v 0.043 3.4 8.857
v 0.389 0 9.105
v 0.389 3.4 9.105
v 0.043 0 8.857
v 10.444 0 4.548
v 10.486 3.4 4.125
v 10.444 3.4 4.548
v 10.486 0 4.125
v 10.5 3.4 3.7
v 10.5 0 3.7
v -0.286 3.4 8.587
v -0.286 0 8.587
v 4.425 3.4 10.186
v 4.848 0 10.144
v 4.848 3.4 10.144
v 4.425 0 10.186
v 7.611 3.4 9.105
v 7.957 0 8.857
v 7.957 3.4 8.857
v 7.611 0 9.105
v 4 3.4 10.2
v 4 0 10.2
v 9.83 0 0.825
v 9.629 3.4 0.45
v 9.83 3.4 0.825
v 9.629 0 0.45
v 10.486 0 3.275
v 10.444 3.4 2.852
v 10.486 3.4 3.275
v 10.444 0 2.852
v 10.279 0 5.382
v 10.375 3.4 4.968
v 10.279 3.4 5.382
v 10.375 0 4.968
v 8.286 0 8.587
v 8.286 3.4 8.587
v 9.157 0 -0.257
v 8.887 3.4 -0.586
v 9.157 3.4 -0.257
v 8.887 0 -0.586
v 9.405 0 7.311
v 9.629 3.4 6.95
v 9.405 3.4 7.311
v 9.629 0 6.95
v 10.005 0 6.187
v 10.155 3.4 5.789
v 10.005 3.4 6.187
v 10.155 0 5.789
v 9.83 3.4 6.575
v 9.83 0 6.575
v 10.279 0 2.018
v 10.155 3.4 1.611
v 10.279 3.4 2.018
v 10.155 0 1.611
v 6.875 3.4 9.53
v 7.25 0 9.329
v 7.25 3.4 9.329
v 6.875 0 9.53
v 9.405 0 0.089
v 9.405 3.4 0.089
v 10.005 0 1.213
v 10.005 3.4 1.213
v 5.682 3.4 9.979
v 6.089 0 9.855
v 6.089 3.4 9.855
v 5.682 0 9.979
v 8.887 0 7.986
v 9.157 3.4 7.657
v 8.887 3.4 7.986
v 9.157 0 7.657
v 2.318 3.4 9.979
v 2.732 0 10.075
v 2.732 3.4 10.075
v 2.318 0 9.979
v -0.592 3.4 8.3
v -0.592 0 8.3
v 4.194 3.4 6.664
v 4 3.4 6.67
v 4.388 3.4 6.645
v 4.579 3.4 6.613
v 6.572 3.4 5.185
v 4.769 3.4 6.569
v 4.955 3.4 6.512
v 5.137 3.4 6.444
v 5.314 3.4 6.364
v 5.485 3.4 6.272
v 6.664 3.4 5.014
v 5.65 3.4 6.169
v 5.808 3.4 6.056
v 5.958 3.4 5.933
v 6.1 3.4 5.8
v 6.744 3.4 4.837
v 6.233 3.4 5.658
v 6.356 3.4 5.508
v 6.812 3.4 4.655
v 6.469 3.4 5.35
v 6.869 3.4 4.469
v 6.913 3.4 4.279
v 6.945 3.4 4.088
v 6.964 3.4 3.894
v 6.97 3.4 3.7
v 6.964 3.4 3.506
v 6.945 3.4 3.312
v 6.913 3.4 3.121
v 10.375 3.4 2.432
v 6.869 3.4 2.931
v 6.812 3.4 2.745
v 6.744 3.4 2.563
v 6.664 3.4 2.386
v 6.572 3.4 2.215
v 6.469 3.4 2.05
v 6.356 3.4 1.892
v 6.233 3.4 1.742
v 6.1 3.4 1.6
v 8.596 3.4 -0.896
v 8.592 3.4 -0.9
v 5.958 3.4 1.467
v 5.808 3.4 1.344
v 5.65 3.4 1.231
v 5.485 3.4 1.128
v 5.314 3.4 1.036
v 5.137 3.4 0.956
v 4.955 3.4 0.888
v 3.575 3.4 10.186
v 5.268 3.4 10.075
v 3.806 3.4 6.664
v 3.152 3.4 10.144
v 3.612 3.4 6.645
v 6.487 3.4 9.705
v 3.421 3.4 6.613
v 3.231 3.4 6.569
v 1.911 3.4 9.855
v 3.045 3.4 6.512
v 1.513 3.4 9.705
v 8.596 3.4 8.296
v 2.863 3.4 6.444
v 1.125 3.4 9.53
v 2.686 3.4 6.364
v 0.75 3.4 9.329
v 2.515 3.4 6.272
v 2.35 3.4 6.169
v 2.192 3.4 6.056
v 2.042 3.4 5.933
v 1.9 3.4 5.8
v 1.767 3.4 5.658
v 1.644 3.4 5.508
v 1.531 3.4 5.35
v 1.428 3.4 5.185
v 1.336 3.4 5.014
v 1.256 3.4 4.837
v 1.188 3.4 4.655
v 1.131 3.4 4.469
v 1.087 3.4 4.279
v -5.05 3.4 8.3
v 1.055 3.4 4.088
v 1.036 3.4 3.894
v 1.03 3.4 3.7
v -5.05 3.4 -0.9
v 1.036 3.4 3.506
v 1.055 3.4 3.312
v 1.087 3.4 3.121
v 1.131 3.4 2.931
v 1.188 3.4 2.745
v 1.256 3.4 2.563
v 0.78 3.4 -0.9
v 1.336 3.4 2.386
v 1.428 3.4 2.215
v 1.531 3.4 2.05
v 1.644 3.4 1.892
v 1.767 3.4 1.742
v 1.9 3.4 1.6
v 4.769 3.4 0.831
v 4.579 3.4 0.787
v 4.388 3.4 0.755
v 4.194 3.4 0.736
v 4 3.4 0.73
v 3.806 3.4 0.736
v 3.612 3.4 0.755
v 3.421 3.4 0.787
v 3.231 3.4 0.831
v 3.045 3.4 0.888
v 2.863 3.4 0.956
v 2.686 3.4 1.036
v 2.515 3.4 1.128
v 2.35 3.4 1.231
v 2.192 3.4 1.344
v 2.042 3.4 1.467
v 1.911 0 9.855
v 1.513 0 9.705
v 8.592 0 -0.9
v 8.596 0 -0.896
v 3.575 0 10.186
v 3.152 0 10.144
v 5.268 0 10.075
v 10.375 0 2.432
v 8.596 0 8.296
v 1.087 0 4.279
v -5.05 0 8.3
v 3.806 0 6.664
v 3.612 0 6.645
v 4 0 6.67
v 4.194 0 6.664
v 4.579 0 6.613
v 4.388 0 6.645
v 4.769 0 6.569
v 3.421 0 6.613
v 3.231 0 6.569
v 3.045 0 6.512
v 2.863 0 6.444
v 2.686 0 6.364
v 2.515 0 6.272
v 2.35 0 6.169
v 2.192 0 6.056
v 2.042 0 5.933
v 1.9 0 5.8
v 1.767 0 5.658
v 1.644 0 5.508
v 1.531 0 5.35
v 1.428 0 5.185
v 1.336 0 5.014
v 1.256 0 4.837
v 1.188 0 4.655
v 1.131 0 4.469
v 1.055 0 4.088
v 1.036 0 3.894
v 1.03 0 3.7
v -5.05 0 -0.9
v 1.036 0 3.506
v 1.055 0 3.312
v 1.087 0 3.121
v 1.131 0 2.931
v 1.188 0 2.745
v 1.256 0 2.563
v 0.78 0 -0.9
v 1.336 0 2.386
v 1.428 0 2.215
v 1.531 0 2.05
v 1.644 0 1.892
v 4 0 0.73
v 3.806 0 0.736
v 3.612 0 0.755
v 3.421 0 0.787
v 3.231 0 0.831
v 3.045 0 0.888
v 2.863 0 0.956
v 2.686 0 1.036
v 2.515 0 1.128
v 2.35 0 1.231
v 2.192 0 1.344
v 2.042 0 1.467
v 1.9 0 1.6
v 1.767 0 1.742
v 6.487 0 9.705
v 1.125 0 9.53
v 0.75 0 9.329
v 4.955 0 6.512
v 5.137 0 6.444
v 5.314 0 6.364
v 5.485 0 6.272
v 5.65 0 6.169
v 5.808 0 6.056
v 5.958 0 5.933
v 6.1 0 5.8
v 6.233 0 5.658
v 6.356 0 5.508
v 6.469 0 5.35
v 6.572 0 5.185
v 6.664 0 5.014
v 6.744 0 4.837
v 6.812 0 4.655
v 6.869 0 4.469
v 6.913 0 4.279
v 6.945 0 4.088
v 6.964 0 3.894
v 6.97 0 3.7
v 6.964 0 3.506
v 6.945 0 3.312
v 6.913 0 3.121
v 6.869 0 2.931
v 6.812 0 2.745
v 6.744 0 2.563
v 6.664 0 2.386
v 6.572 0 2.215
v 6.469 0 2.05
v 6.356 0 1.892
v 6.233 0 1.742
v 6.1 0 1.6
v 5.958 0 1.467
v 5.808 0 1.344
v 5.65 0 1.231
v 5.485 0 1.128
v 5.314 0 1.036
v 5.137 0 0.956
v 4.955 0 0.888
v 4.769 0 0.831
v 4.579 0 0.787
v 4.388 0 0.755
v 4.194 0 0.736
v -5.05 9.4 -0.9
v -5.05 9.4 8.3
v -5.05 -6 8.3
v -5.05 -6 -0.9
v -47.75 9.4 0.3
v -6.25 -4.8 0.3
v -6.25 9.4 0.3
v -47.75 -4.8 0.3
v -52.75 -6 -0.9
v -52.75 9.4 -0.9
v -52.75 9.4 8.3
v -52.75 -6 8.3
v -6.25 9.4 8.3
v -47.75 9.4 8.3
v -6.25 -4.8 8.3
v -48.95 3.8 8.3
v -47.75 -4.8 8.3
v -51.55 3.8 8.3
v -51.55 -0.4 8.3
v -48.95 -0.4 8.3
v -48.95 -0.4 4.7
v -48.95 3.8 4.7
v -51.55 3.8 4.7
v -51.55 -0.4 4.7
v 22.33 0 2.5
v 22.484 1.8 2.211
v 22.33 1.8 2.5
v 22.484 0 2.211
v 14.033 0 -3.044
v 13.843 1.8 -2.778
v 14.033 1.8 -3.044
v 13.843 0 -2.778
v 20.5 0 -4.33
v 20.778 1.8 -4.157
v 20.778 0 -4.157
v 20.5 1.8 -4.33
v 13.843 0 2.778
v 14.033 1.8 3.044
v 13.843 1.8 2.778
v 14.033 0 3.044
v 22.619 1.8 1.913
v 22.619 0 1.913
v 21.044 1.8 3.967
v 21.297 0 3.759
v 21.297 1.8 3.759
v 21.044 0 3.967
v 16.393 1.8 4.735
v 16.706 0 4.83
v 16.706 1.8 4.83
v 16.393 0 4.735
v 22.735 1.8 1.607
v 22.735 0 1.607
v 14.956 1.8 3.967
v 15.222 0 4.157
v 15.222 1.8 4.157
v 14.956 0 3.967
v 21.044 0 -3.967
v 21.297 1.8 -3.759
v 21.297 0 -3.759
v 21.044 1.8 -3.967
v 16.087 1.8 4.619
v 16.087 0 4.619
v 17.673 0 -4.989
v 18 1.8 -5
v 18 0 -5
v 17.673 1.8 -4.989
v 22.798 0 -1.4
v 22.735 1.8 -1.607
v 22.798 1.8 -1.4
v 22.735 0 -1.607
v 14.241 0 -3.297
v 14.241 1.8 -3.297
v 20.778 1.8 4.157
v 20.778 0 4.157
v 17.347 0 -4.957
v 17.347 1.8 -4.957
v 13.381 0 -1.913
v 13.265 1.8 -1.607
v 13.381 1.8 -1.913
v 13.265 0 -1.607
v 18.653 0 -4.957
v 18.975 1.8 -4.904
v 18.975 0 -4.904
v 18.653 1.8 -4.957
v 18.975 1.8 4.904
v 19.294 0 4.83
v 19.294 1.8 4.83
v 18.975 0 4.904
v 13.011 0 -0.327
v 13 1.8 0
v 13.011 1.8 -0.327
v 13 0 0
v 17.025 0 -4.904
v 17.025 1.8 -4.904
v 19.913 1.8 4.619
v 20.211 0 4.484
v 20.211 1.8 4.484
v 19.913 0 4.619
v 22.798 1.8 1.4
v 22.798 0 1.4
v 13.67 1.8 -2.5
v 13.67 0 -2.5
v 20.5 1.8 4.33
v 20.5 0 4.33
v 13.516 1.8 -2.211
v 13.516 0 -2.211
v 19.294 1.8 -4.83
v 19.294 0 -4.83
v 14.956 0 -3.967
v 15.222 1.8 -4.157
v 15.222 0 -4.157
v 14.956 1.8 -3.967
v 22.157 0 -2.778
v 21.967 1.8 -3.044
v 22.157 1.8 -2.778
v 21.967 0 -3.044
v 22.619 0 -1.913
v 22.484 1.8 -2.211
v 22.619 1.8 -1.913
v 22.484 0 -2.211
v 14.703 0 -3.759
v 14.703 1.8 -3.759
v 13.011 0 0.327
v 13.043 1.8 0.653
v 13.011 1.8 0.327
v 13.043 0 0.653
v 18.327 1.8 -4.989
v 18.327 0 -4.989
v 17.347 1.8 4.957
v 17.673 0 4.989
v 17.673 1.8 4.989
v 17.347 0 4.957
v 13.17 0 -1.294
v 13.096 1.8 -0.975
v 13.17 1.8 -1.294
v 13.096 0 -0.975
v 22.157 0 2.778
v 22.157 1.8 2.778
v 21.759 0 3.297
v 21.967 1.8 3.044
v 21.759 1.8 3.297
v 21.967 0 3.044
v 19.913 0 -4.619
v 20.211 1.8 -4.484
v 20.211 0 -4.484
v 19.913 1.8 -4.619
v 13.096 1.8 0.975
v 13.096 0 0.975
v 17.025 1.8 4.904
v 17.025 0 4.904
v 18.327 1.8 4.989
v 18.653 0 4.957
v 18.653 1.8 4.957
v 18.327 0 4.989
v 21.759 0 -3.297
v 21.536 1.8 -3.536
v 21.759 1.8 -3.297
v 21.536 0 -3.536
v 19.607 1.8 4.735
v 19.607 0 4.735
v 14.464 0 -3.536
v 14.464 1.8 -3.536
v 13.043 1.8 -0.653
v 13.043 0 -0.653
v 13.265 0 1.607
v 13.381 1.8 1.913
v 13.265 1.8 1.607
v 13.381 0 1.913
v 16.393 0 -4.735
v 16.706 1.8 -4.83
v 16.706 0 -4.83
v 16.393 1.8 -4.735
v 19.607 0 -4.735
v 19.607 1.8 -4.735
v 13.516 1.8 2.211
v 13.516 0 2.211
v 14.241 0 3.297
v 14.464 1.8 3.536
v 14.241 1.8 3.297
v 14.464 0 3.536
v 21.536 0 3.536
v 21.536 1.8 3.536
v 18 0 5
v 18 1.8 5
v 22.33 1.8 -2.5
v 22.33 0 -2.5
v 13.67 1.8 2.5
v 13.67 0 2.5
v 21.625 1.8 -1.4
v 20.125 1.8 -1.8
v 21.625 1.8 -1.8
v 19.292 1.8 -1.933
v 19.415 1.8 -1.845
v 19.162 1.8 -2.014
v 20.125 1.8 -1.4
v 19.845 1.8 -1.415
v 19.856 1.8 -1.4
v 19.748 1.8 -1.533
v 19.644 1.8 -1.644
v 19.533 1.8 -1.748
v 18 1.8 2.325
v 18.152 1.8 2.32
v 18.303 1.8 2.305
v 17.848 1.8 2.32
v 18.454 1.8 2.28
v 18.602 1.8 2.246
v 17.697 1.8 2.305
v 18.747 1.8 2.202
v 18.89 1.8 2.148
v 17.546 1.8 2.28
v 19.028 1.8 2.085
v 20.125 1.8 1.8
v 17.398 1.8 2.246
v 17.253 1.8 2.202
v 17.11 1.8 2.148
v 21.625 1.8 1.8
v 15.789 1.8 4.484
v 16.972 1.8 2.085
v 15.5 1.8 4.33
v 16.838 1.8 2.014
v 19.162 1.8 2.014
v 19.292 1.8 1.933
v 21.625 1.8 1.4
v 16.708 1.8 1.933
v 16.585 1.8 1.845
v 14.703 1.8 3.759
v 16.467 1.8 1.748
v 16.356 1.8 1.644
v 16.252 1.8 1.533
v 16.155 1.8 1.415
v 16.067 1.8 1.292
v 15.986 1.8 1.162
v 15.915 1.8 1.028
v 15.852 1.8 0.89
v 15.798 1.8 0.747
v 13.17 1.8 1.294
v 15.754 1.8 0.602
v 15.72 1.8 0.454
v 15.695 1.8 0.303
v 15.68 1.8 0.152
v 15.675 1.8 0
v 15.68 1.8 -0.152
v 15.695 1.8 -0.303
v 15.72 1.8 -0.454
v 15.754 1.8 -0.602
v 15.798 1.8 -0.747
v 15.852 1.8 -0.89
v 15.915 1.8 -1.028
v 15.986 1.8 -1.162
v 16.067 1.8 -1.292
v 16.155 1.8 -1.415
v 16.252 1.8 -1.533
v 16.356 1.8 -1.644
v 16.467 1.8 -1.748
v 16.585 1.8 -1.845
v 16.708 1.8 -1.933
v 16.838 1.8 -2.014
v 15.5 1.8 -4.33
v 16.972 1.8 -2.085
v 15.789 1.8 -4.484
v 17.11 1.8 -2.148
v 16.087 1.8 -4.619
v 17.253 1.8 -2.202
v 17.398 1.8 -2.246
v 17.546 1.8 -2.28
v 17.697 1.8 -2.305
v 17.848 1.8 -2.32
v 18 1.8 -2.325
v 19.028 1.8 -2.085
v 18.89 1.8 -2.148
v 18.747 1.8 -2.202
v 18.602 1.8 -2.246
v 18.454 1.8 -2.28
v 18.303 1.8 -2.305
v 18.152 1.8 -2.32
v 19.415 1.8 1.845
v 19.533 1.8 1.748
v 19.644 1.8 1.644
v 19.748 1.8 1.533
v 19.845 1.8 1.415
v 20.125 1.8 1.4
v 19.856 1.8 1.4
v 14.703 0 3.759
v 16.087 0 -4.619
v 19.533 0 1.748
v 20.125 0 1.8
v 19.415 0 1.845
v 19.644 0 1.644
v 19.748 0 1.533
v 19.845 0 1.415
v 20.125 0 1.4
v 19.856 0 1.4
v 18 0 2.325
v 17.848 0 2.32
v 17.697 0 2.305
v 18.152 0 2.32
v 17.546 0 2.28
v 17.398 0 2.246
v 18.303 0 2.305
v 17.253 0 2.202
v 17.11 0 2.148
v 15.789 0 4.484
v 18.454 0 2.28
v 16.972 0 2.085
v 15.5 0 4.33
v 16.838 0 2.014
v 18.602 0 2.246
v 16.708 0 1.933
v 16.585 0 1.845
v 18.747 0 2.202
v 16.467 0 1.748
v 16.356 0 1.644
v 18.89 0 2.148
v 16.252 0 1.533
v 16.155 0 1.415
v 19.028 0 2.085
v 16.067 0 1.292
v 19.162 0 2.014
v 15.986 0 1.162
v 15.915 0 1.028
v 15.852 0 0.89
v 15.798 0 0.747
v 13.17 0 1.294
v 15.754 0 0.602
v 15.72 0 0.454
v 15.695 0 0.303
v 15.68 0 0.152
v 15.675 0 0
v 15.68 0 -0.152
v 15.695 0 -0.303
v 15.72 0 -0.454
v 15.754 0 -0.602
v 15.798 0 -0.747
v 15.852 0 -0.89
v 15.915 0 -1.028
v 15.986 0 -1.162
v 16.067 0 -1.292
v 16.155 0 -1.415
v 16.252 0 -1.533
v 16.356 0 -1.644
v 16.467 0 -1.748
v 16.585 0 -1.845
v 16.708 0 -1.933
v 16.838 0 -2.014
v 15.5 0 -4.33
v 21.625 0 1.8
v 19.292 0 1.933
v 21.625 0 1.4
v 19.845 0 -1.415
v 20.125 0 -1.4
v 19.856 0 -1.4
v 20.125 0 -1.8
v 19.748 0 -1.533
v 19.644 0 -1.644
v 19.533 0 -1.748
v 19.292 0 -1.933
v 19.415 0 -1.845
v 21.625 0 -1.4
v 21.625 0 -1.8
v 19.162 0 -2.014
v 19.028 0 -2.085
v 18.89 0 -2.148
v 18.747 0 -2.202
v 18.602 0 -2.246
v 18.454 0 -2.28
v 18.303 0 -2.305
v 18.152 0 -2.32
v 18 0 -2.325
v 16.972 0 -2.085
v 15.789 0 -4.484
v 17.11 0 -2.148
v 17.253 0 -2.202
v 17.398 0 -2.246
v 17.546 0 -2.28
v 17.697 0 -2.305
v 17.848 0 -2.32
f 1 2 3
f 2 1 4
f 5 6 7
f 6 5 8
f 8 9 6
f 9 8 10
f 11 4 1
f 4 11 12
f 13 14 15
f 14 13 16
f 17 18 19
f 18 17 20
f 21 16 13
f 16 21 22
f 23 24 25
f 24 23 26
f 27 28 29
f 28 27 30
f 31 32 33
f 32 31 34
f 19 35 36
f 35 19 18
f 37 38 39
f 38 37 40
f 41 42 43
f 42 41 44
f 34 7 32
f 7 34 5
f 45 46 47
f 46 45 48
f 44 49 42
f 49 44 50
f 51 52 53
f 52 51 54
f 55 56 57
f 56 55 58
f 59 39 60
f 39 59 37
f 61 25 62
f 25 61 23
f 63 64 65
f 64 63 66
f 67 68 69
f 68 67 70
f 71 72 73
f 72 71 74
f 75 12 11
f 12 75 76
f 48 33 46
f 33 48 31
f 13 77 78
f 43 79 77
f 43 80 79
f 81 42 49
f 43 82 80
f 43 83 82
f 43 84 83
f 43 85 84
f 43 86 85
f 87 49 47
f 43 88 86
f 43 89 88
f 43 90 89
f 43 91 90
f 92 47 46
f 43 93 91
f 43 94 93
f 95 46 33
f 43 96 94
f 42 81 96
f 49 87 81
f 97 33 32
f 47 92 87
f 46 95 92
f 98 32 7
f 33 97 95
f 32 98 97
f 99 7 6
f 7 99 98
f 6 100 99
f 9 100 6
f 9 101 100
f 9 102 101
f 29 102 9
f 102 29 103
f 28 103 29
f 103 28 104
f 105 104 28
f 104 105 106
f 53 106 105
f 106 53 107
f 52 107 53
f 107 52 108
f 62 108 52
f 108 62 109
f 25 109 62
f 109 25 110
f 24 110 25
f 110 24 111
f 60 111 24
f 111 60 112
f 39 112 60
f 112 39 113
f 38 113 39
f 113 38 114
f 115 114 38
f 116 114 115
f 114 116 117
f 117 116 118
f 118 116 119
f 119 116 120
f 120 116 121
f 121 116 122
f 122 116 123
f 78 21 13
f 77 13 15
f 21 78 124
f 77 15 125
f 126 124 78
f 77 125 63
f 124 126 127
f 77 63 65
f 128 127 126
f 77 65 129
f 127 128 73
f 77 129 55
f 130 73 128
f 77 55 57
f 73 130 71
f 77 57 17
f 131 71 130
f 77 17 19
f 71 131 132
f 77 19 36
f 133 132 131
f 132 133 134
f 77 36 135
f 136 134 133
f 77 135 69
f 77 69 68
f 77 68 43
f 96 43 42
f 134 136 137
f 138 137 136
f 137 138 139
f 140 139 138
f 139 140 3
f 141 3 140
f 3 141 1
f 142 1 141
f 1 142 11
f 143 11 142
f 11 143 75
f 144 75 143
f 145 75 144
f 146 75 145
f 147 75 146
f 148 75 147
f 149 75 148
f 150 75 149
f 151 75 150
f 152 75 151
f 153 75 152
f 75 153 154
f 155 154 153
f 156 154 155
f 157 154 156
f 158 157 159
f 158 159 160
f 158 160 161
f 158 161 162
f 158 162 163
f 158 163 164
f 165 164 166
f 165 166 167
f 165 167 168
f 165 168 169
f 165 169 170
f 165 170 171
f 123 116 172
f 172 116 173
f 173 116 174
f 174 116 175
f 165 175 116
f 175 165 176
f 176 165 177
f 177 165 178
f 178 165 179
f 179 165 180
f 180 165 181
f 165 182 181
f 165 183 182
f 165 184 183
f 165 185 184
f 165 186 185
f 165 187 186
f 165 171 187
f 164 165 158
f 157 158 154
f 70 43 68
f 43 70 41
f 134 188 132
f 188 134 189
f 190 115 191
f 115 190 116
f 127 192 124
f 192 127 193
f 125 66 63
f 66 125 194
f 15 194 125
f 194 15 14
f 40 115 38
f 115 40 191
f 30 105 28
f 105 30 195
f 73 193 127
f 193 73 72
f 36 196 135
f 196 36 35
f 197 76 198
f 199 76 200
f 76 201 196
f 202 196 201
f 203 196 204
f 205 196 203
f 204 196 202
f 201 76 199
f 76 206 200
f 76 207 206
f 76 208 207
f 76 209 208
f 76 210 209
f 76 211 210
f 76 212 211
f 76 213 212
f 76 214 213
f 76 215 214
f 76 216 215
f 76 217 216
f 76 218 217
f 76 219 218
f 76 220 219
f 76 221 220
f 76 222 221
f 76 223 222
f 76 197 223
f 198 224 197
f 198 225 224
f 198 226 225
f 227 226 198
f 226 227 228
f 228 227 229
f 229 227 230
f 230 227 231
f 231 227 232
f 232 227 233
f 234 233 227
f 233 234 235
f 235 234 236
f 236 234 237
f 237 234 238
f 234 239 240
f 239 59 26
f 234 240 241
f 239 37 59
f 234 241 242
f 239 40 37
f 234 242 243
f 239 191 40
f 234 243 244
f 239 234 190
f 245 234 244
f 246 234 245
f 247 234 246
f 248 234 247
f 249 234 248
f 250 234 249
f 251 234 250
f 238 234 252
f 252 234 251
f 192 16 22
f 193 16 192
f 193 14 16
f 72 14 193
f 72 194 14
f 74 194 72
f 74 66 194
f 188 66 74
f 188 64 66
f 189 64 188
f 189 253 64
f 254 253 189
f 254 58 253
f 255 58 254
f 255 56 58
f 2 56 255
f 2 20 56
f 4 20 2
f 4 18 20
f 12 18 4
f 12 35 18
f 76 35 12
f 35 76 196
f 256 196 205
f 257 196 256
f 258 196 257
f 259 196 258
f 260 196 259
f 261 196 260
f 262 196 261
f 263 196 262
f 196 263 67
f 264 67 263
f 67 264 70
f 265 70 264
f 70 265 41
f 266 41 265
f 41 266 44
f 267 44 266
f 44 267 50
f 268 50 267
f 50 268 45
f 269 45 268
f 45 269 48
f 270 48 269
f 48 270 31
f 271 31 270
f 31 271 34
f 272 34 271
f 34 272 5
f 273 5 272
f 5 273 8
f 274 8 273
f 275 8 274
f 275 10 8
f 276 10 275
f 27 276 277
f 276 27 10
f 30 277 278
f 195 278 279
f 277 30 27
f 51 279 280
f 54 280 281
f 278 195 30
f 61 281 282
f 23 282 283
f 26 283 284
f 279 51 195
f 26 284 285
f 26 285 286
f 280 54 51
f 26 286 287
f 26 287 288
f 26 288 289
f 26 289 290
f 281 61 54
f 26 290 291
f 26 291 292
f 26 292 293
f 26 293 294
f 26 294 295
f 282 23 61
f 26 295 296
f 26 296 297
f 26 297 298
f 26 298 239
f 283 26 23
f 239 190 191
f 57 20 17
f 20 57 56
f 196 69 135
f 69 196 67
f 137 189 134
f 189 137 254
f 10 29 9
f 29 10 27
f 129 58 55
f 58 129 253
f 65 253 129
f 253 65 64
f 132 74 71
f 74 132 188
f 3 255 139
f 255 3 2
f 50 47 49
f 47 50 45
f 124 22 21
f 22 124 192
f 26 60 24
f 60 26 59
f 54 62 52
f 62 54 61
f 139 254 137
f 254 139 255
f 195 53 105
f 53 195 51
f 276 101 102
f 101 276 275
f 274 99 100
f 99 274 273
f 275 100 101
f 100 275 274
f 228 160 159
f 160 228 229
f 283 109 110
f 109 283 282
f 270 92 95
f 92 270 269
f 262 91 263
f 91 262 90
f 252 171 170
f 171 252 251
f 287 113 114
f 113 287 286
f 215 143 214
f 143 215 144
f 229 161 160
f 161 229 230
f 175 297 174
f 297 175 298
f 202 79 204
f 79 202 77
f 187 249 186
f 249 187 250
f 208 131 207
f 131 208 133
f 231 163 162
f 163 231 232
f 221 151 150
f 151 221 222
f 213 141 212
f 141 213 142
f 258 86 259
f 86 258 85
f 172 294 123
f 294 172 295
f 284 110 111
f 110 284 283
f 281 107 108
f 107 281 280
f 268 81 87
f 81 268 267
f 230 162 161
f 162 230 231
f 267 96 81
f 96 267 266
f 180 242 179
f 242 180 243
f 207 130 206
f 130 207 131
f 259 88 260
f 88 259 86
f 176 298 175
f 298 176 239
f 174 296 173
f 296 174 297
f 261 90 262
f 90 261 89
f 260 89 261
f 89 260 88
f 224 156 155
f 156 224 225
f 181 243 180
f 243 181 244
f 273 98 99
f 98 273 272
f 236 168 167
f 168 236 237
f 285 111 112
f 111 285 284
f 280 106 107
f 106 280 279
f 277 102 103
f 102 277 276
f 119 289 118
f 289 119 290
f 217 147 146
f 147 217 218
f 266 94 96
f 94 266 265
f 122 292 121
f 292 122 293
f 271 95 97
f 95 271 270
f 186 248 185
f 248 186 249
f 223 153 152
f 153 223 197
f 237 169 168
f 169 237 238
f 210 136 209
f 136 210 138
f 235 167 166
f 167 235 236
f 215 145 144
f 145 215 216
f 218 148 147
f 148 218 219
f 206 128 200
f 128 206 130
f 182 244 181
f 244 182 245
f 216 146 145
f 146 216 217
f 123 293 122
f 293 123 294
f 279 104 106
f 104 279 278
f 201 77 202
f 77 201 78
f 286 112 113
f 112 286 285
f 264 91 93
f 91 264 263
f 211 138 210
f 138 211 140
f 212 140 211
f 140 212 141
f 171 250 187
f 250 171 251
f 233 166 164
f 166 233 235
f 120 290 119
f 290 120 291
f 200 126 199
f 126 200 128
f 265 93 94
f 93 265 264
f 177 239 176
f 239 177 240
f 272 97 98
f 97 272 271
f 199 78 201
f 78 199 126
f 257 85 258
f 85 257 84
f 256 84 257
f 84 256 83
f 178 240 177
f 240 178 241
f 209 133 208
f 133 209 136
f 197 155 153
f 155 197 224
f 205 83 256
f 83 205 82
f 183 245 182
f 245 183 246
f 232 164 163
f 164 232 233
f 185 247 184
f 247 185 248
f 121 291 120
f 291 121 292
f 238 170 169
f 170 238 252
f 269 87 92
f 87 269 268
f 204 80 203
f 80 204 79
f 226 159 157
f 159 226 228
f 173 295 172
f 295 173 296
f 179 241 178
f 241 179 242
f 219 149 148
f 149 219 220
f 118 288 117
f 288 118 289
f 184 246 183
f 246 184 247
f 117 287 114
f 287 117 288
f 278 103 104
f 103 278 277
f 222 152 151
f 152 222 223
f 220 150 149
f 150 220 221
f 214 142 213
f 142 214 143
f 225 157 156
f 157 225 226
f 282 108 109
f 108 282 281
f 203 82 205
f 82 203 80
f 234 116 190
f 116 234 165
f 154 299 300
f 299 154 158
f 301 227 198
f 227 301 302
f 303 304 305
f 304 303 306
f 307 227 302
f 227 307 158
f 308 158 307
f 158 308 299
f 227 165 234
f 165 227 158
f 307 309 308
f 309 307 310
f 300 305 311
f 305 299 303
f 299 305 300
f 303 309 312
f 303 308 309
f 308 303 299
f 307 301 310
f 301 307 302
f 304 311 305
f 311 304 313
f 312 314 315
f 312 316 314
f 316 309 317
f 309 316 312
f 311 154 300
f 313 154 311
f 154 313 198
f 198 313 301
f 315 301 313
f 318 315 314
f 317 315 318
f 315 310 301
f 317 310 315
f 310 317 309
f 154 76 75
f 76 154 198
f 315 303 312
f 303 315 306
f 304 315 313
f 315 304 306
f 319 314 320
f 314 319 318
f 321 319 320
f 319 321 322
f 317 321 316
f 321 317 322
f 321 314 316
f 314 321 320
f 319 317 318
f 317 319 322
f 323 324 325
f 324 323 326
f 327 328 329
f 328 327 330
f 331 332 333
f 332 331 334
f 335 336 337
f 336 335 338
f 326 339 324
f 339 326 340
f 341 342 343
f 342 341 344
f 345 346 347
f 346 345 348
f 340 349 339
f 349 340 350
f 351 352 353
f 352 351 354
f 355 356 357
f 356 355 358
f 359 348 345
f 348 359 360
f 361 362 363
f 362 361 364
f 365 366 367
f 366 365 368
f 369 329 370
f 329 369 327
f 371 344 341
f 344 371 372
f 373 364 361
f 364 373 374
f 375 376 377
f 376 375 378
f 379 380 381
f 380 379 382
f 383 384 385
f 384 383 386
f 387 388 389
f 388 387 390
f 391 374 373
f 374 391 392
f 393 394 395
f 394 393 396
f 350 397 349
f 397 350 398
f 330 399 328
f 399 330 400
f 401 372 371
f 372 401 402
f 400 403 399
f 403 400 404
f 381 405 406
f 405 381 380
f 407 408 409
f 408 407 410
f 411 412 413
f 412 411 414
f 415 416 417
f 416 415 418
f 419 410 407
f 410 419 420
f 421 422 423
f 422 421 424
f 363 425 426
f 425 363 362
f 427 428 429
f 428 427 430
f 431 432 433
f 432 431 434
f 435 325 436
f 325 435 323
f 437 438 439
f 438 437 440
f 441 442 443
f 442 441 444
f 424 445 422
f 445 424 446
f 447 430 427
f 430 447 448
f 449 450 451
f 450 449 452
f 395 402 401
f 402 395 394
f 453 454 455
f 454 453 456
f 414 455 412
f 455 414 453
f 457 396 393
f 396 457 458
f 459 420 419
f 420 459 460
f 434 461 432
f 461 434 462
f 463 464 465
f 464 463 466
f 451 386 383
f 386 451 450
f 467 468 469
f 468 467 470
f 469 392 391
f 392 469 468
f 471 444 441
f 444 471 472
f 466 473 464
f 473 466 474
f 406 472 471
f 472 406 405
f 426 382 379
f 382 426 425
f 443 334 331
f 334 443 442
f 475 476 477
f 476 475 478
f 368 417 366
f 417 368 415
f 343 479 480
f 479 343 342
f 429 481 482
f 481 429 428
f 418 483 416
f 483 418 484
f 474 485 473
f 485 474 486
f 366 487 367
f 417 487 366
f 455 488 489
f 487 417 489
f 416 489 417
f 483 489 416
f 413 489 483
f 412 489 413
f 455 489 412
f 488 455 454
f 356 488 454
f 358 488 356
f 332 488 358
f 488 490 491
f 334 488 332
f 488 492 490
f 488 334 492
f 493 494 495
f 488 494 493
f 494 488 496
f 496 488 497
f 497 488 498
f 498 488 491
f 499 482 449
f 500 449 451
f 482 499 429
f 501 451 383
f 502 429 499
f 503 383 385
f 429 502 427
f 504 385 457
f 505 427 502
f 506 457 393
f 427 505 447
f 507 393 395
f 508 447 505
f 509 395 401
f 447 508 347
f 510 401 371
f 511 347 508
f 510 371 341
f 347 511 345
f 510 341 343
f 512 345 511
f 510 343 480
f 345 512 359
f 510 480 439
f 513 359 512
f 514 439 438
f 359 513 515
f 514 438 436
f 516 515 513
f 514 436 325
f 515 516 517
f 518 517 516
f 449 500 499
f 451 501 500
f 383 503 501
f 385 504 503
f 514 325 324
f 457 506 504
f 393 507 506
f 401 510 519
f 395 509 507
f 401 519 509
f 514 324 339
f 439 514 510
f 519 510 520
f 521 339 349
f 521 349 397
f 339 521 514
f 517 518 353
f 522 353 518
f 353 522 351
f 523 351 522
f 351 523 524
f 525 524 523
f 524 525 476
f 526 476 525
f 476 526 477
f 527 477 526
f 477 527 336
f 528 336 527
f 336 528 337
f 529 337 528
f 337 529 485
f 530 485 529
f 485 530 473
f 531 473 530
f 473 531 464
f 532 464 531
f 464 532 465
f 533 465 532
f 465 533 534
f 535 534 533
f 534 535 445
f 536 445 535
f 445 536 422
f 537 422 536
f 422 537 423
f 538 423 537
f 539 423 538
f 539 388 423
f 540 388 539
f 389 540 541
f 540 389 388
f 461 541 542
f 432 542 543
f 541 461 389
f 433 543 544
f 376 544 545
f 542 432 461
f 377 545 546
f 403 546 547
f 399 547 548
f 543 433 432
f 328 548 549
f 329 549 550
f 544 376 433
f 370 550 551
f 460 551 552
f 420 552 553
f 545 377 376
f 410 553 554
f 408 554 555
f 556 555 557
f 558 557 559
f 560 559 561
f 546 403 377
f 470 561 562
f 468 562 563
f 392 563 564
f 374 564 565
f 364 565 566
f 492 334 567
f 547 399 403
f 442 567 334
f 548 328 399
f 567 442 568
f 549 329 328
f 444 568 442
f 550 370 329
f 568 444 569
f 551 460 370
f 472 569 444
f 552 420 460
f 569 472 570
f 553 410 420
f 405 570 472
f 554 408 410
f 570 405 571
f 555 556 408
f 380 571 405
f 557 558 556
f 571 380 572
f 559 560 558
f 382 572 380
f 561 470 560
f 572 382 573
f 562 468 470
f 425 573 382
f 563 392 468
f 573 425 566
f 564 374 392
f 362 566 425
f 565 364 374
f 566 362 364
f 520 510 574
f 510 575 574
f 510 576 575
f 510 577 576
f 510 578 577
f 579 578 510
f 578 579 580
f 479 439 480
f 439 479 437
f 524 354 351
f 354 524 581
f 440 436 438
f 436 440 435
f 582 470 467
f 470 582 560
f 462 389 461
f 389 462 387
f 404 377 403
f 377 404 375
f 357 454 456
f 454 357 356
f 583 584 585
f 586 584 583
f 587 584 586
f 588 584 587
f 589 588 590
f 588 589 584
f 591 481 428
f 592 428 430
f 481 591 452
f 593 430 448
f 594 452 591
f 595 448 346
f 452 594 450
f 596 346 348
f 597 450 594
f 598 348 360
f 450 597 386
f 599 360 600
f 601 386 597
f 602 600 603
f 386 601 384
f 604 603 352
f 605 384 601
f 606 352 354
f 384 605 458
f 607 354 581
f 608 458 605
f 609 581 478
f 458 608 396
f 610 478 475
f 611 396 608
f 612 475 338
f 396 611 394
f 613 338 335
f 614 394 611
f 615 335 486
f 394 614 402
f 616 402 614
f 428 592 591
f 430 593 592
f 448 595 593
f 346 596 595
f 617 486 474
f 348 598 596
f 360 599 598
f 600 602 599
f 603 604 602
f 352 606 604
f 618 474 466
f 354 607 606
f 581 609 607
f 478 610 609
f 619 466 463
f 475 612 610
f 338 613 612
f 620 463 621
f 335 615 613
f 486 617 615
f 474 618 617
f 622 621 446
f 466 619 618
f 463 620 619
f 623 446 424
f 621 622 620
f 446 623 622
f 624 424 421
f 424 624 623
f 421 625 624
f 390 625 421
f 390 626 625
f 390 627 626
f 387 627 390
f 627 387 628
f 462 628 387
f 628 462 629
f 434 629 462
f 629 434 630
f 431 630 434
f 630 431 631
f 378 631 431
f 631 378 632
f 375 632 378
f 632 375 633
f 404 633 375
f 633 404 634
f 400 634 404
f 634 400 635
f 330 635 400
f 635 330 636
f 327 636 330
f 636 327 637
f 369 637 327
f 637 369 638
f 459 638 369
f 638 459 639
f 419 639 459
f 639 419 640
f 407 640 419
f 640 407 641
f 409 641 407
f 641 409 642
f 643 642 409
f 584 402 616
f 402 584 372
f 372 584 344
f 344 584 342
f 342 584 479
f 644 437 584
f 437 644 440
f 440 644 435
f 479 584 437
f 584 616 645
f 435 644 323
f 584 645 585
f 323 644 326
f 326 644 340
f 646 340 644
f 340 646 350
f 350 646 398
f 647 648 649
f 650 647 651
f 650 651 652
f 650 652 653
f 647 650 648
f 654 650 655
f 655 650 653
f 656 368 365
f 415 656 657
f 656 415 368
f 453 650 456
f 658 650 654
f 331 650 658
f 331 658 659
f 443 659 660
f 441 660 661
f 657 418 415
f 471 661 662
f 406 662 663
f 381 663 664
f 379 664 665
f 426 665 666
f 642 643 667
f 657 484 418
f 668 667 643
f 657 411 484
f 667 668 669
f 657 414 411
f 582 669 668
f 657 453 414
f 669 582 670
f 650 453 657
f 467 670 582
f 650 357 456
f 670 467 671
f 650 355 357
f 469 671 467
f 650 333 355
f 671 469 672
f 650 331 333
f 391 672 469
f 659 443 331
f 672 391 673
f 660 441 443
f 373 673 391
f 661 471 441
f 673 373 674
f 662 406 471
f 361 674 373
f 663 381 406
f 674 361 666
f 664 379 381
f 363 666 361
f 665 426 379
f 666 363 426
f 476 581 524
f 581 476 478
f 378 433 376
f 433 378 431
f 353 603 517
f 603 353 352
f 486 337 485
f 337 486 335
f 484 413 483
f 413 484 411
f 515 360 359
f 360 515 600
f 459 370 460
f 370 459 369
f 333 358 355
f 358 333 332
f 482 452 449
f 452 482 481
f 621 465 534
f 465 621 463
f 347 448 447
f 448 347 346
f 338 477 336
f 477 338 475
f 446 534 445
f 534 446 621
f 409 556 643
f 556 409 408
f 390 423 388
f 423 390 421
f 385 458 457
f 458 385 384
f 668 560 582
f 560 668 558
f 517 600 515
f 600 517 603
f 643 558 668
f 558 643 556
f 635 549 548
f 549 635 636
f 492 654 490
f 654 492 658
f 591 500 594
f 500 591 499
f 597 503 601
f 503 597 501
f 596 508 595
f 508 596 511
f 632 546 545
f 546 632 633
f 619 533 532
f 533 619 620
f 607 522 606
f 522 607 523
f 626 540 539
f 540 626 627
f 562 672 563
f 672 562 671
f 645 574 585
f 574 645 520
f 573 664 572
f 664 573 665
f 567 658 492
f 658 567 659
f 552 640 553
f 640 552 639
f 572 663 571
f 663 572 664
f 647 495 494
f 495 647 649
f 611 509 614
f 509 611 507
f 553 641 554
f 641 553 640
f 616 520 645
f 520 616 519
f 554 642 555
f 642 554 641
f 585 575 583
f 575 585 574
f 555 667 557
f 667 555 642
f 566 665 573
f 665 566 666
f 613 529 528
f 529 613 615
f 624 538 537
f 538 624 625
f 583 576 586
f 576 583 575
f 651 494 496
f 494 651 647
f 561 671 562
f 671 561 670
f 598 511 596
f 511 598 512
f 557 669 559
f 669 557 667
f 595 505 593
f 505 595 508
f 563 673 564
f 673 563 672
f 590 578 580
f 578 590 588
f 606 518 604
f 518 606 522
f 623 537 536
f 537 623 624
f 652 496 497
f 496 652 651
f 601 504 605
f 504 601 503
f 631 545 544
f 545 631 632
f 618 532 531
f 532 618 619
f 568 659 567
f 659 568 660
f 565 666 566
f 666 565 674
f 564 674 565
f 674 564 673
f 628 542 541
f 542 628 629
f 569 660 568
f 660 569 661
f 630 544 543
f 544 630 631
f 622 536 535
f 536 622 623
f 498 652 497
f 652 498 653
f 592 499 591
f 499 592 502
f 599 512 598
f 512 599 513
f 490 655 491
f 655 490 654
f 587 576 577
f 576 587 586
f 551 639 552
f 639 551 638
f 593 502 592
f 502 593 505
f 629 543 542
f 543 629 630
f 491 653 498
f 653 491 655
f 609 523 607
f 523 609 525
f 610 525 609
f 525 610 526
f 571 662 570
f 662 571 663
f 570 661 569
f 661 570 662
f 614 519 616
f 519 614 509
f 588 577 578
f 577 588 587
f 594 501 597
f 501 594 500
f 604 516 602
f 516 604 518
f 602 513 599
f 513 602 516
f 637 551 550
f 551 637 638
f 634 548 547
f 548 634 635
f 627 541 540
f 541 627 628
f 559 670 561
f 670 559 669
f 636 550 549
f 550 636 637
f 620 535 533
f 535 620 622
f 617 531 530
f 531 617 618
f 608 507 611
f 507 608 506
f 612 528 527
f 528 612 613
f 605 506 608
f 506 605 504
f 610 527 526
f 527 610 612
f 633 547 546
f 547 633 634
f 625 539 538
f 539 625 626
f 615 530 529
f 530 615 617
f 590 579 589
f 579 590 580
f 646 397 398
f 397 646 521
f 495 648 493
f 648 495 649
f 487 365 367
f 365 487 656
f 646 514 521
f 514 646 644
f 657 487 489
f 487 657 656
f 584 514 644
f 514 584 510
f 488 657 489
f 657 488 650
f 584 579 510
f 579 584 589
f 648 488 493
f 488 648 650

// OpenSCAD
// DOUBLE TAKE FRAMES DESIGN RELEASE
// DTF_RELEASE: 2.0.1
// Released: 2026-09-02
// Versioning: Semantic Versioning 2.0.0 (https://semver.org/)
// Status: CANONICAL
// Changes in 2.0.1:
// - Carried forward unchanged for the prepared-project packaging correction.
// Changes in 2.0.0:
// - Carried forward without geometry changes for the coordinated 2.0.0 release.
// Full release notes: https://doubletakeframes.com/build/#design-release
//
$fn = 96;

eps = 0.05;

// 0 = separated printable latch and keeper
// 1 = FN-weight latch only
// 2 = C-shaped keeper only
render_part = 0;

// =========================================================
// FN WEIGHT LATCH
// =========================================================
post_d = 5.5;
clear_radial = 0.22;
eye_inner_d = post_d + 2 * clear_radial;
eye_outer_d = 13.0;

latch_t = 3.4;
pivot_x = 4.0;

corral_clear_w_x = 41.5;
corral_clear_d_y = 13.0;
corral_wall_t = 1.2;
corral_depth_z = 8.0;
corral_floor_t = 1.2;
corral_end_wall_t_x = 5.0;
canonical_weight_center_x = -27.0;

// Match the installed latch plane used by the canonical dry-wall rig.
standoff_h = 0.8;
post_h = 4.0;
corral_global_outer_y1 = -0.30;
corral_center_y_target = corral_global_outer_y1
                         - (corral_clear_d_y + 2 * corral_wall_t) / 2;
pad_t = -corral_center_y_target - standoff_h - post_h / 2;
post_y1 = -pad_t - standoff_h - post_h;
latch_install_y = post_y1 + (post_h - latch_t) / 2;

corral_inner_x0 = canonical_weight_center_x - corral_clear_w_x / 2;
corral_inner_x1 = canonical_weight_center_x + corral_clear_w_x / 2;
corral_floor_x0 = corral_inner_x0 - corral_end_wall_t_x;
corral_floor_x1 = corral_inner_x1 + corral_wall_t;

corral_outer_y1 = corral_global_outer_y1 - latch_install_y;
corral_inner_y1 = corral_outer_y1 - corral_wall_t;
corral_inner_y0 = corral_inner_y1 - corral_clear_d_y;
corral_outer_y0 = corral_inner_y0 - corral_wall_t;

corral_floor_z0 = -0.90;
corral_floor_z = corral_floor_z0 + corral_floor_t;
corral_wall_z1 = corral_floor_z + corral_depth_z;
pivot_z = (corral_floor_z0 + corral_wall_z1) / 2;
pivot_eye_flat_local_z = corral_floor_z0 - pivot_z;

pivot_transition_x0 = corral_floor_x1;
pivot_transition_x1 = pivot_x - (eye_inner_d / 2 + 0.25);

// Far-end Y-retention socket. The matching roof-hung tooth belongs to the
// fixed dry-wall rig; this socket is open at the top so the latch disengages
// cleanly as it swings downward.
latch_key_tooth_w_x = 1.4;
latch_key_tooth_w_y = 3.0;
latch_key_clear_xy = 0.60;
latch_key_clear_z = 0.60;
latch_key_engagement_z = 3.0;

latch_key_xc = (corral_floor_x0 + corral_inner_x0) / 2;
latch_key_local_yc = (corral_outer_y0 + corral_outer_y1) / 2;
latch_key_notch_x0 = latch_key_xc - latch_key_tooth_w_x / 2
                     - latch_key_clear_xy;
latch_key_notch_x1 = latch_key_xc + latch_key_tooth_w_x / 2
                     + latch_key_clear_xy;
latch_key_notch_y0 = latch_key_local_yc - latch_key_tooth_w_y / 2
                     - latch_key_clear_xy;
latch_key_notch_y1 = latch_key_local_yc + latch_key_tooth_w_y / 2
                     + latch_key_clear_xy;
latch_key_notch_z0 = corral_wall_z1 - latch_key_engagement_z
                     - latch_key_clear_z;

// =========================================================
// C-SHAPED KEEPER
// =========================================================
clip_outer_d = 10.0;
clip_t = 1.8;
grip_hole_d = 4.65;
gap_w = 2.8;
flat_depth = 1.5;

// =========================================================
// HELPERS
// =========================================================
module rect_prism(x0, x1, y0, y1, z0, z1) {
    translate([min(x0, x1), min(y0, y1), min(z0, z1)])
        cube([abs(x1 - x0), abs(y1 - y0), abs(z1 - z0)]);
}

module cyl_y_span(d, y0, y1) {
    translate([0, max(y0, y1), 0])
        rotate([90, 0, 0])
            cylinder(d=d, h=abs(y1 - y0), center=false);
}

// =========================================================
// PRINTABLE PARTS
// =========================================================
module canonical_latch_core() {
    translate([pivot_x, 0, pivot_z])
        difference() {
            cyl_y_span(eye_outer_d, 0, latch_t);
            cyl_y_span(eye_inner_d, -0.1, latch_t + 0.2);

            // Flatten only the unused lower eye arc so the complete latch
            // prints on the same plane as the corral floor.
            rect_prism(-eye_outer_d / 2 - 1,
                       eye_outer_d / 2 + 1,
                       -0.1, latch_t + 0.2,
                       -eye_outer_d / 2 - 1,
                       pivot_eye_flat_local_z);
        }
}

module fn_weight_corral() {
    difference() {
        union() {
            // Shallow floor beneath the weight pocket and keyed extension.
            rect_prism(corral_floor_x0, corral_floor_x1,
                       corral_outer_y0, corral_outer_y1,
                       corral_floor_z0, corral_floor_z);

            // Viewer-facing wall. The frame wall closes the opposite side.
            rect_prism(corral_inner_x0, corral_inner_x1,
                       corral_outer_y0, corral_inner_y0,
                       corral_floor_z, corral_wall_z1);

            // Pivot-side wall.
            rect_prism(corral_inner_x1, corral_floor_x1,
                       corral_outer_y0, corral_outer_y1,
                       corral_floor_z, corral_wall_z1);

            // Substantial far-end wall carrying the retention socket.
            rect_prism(corral_floor_x0, corral_inner_x0,
                       corral_outer_y0, corral_outer_y1,
                       corral_floor_z, corral_wall_z1);

            // Compact load path from the corral into the pivot eye.
            rect_prism(pivot_transition_x0, pivot_transition_x1,
                       0, latch_t,
                       corral_floor_z0, corral_wall_z1);
        }

        rect_prism(latch_key_notch_x0, latch_key_notch_x1,
                   latch_key_notch_y0, latch_key_notch_y1,
                   latch_key_notch_z0, corral_wall_z1 + eps);
    }
}

module swinging_latch() {
    union() {
        canonical_latch_core();
        fn_weight_corral();
    }
}

module c_keeper() {
    difference() {
        cyl_y_span(clip_outer_d, 0, clip_t);
        cyl_y_span(grip_hole_d, -0.1, clip_t + 0.2);

        rect_prism(0, clip_outer_d / 2 + 0.5,
                   -0.1, clip_t + 0.1,
                   -gap_w / 2, gap_w / 2);

        rect_prism(grip_hole_d / 2 - 0.2,
                   grip_hole_d / 2 - 0.2 + flat_depth,
                   -0.1, clip_t + 0.1,
                   -gap_w / 2 - 0.4, gap_w / 2 + 0.4);
    }
}

assert(corral_clear_w_x == 41.5);
assert(corral_clear_d_y == 13.0);
assert(pivot_transition_x1 > pivot_transition_x0);

if (render_part == 1)
    swinging_latch();
else if (render_part == 2)
    c_keeper();
else {
    swinging_latch();
    translate([18, 0, 0]) c_keeper();
}
